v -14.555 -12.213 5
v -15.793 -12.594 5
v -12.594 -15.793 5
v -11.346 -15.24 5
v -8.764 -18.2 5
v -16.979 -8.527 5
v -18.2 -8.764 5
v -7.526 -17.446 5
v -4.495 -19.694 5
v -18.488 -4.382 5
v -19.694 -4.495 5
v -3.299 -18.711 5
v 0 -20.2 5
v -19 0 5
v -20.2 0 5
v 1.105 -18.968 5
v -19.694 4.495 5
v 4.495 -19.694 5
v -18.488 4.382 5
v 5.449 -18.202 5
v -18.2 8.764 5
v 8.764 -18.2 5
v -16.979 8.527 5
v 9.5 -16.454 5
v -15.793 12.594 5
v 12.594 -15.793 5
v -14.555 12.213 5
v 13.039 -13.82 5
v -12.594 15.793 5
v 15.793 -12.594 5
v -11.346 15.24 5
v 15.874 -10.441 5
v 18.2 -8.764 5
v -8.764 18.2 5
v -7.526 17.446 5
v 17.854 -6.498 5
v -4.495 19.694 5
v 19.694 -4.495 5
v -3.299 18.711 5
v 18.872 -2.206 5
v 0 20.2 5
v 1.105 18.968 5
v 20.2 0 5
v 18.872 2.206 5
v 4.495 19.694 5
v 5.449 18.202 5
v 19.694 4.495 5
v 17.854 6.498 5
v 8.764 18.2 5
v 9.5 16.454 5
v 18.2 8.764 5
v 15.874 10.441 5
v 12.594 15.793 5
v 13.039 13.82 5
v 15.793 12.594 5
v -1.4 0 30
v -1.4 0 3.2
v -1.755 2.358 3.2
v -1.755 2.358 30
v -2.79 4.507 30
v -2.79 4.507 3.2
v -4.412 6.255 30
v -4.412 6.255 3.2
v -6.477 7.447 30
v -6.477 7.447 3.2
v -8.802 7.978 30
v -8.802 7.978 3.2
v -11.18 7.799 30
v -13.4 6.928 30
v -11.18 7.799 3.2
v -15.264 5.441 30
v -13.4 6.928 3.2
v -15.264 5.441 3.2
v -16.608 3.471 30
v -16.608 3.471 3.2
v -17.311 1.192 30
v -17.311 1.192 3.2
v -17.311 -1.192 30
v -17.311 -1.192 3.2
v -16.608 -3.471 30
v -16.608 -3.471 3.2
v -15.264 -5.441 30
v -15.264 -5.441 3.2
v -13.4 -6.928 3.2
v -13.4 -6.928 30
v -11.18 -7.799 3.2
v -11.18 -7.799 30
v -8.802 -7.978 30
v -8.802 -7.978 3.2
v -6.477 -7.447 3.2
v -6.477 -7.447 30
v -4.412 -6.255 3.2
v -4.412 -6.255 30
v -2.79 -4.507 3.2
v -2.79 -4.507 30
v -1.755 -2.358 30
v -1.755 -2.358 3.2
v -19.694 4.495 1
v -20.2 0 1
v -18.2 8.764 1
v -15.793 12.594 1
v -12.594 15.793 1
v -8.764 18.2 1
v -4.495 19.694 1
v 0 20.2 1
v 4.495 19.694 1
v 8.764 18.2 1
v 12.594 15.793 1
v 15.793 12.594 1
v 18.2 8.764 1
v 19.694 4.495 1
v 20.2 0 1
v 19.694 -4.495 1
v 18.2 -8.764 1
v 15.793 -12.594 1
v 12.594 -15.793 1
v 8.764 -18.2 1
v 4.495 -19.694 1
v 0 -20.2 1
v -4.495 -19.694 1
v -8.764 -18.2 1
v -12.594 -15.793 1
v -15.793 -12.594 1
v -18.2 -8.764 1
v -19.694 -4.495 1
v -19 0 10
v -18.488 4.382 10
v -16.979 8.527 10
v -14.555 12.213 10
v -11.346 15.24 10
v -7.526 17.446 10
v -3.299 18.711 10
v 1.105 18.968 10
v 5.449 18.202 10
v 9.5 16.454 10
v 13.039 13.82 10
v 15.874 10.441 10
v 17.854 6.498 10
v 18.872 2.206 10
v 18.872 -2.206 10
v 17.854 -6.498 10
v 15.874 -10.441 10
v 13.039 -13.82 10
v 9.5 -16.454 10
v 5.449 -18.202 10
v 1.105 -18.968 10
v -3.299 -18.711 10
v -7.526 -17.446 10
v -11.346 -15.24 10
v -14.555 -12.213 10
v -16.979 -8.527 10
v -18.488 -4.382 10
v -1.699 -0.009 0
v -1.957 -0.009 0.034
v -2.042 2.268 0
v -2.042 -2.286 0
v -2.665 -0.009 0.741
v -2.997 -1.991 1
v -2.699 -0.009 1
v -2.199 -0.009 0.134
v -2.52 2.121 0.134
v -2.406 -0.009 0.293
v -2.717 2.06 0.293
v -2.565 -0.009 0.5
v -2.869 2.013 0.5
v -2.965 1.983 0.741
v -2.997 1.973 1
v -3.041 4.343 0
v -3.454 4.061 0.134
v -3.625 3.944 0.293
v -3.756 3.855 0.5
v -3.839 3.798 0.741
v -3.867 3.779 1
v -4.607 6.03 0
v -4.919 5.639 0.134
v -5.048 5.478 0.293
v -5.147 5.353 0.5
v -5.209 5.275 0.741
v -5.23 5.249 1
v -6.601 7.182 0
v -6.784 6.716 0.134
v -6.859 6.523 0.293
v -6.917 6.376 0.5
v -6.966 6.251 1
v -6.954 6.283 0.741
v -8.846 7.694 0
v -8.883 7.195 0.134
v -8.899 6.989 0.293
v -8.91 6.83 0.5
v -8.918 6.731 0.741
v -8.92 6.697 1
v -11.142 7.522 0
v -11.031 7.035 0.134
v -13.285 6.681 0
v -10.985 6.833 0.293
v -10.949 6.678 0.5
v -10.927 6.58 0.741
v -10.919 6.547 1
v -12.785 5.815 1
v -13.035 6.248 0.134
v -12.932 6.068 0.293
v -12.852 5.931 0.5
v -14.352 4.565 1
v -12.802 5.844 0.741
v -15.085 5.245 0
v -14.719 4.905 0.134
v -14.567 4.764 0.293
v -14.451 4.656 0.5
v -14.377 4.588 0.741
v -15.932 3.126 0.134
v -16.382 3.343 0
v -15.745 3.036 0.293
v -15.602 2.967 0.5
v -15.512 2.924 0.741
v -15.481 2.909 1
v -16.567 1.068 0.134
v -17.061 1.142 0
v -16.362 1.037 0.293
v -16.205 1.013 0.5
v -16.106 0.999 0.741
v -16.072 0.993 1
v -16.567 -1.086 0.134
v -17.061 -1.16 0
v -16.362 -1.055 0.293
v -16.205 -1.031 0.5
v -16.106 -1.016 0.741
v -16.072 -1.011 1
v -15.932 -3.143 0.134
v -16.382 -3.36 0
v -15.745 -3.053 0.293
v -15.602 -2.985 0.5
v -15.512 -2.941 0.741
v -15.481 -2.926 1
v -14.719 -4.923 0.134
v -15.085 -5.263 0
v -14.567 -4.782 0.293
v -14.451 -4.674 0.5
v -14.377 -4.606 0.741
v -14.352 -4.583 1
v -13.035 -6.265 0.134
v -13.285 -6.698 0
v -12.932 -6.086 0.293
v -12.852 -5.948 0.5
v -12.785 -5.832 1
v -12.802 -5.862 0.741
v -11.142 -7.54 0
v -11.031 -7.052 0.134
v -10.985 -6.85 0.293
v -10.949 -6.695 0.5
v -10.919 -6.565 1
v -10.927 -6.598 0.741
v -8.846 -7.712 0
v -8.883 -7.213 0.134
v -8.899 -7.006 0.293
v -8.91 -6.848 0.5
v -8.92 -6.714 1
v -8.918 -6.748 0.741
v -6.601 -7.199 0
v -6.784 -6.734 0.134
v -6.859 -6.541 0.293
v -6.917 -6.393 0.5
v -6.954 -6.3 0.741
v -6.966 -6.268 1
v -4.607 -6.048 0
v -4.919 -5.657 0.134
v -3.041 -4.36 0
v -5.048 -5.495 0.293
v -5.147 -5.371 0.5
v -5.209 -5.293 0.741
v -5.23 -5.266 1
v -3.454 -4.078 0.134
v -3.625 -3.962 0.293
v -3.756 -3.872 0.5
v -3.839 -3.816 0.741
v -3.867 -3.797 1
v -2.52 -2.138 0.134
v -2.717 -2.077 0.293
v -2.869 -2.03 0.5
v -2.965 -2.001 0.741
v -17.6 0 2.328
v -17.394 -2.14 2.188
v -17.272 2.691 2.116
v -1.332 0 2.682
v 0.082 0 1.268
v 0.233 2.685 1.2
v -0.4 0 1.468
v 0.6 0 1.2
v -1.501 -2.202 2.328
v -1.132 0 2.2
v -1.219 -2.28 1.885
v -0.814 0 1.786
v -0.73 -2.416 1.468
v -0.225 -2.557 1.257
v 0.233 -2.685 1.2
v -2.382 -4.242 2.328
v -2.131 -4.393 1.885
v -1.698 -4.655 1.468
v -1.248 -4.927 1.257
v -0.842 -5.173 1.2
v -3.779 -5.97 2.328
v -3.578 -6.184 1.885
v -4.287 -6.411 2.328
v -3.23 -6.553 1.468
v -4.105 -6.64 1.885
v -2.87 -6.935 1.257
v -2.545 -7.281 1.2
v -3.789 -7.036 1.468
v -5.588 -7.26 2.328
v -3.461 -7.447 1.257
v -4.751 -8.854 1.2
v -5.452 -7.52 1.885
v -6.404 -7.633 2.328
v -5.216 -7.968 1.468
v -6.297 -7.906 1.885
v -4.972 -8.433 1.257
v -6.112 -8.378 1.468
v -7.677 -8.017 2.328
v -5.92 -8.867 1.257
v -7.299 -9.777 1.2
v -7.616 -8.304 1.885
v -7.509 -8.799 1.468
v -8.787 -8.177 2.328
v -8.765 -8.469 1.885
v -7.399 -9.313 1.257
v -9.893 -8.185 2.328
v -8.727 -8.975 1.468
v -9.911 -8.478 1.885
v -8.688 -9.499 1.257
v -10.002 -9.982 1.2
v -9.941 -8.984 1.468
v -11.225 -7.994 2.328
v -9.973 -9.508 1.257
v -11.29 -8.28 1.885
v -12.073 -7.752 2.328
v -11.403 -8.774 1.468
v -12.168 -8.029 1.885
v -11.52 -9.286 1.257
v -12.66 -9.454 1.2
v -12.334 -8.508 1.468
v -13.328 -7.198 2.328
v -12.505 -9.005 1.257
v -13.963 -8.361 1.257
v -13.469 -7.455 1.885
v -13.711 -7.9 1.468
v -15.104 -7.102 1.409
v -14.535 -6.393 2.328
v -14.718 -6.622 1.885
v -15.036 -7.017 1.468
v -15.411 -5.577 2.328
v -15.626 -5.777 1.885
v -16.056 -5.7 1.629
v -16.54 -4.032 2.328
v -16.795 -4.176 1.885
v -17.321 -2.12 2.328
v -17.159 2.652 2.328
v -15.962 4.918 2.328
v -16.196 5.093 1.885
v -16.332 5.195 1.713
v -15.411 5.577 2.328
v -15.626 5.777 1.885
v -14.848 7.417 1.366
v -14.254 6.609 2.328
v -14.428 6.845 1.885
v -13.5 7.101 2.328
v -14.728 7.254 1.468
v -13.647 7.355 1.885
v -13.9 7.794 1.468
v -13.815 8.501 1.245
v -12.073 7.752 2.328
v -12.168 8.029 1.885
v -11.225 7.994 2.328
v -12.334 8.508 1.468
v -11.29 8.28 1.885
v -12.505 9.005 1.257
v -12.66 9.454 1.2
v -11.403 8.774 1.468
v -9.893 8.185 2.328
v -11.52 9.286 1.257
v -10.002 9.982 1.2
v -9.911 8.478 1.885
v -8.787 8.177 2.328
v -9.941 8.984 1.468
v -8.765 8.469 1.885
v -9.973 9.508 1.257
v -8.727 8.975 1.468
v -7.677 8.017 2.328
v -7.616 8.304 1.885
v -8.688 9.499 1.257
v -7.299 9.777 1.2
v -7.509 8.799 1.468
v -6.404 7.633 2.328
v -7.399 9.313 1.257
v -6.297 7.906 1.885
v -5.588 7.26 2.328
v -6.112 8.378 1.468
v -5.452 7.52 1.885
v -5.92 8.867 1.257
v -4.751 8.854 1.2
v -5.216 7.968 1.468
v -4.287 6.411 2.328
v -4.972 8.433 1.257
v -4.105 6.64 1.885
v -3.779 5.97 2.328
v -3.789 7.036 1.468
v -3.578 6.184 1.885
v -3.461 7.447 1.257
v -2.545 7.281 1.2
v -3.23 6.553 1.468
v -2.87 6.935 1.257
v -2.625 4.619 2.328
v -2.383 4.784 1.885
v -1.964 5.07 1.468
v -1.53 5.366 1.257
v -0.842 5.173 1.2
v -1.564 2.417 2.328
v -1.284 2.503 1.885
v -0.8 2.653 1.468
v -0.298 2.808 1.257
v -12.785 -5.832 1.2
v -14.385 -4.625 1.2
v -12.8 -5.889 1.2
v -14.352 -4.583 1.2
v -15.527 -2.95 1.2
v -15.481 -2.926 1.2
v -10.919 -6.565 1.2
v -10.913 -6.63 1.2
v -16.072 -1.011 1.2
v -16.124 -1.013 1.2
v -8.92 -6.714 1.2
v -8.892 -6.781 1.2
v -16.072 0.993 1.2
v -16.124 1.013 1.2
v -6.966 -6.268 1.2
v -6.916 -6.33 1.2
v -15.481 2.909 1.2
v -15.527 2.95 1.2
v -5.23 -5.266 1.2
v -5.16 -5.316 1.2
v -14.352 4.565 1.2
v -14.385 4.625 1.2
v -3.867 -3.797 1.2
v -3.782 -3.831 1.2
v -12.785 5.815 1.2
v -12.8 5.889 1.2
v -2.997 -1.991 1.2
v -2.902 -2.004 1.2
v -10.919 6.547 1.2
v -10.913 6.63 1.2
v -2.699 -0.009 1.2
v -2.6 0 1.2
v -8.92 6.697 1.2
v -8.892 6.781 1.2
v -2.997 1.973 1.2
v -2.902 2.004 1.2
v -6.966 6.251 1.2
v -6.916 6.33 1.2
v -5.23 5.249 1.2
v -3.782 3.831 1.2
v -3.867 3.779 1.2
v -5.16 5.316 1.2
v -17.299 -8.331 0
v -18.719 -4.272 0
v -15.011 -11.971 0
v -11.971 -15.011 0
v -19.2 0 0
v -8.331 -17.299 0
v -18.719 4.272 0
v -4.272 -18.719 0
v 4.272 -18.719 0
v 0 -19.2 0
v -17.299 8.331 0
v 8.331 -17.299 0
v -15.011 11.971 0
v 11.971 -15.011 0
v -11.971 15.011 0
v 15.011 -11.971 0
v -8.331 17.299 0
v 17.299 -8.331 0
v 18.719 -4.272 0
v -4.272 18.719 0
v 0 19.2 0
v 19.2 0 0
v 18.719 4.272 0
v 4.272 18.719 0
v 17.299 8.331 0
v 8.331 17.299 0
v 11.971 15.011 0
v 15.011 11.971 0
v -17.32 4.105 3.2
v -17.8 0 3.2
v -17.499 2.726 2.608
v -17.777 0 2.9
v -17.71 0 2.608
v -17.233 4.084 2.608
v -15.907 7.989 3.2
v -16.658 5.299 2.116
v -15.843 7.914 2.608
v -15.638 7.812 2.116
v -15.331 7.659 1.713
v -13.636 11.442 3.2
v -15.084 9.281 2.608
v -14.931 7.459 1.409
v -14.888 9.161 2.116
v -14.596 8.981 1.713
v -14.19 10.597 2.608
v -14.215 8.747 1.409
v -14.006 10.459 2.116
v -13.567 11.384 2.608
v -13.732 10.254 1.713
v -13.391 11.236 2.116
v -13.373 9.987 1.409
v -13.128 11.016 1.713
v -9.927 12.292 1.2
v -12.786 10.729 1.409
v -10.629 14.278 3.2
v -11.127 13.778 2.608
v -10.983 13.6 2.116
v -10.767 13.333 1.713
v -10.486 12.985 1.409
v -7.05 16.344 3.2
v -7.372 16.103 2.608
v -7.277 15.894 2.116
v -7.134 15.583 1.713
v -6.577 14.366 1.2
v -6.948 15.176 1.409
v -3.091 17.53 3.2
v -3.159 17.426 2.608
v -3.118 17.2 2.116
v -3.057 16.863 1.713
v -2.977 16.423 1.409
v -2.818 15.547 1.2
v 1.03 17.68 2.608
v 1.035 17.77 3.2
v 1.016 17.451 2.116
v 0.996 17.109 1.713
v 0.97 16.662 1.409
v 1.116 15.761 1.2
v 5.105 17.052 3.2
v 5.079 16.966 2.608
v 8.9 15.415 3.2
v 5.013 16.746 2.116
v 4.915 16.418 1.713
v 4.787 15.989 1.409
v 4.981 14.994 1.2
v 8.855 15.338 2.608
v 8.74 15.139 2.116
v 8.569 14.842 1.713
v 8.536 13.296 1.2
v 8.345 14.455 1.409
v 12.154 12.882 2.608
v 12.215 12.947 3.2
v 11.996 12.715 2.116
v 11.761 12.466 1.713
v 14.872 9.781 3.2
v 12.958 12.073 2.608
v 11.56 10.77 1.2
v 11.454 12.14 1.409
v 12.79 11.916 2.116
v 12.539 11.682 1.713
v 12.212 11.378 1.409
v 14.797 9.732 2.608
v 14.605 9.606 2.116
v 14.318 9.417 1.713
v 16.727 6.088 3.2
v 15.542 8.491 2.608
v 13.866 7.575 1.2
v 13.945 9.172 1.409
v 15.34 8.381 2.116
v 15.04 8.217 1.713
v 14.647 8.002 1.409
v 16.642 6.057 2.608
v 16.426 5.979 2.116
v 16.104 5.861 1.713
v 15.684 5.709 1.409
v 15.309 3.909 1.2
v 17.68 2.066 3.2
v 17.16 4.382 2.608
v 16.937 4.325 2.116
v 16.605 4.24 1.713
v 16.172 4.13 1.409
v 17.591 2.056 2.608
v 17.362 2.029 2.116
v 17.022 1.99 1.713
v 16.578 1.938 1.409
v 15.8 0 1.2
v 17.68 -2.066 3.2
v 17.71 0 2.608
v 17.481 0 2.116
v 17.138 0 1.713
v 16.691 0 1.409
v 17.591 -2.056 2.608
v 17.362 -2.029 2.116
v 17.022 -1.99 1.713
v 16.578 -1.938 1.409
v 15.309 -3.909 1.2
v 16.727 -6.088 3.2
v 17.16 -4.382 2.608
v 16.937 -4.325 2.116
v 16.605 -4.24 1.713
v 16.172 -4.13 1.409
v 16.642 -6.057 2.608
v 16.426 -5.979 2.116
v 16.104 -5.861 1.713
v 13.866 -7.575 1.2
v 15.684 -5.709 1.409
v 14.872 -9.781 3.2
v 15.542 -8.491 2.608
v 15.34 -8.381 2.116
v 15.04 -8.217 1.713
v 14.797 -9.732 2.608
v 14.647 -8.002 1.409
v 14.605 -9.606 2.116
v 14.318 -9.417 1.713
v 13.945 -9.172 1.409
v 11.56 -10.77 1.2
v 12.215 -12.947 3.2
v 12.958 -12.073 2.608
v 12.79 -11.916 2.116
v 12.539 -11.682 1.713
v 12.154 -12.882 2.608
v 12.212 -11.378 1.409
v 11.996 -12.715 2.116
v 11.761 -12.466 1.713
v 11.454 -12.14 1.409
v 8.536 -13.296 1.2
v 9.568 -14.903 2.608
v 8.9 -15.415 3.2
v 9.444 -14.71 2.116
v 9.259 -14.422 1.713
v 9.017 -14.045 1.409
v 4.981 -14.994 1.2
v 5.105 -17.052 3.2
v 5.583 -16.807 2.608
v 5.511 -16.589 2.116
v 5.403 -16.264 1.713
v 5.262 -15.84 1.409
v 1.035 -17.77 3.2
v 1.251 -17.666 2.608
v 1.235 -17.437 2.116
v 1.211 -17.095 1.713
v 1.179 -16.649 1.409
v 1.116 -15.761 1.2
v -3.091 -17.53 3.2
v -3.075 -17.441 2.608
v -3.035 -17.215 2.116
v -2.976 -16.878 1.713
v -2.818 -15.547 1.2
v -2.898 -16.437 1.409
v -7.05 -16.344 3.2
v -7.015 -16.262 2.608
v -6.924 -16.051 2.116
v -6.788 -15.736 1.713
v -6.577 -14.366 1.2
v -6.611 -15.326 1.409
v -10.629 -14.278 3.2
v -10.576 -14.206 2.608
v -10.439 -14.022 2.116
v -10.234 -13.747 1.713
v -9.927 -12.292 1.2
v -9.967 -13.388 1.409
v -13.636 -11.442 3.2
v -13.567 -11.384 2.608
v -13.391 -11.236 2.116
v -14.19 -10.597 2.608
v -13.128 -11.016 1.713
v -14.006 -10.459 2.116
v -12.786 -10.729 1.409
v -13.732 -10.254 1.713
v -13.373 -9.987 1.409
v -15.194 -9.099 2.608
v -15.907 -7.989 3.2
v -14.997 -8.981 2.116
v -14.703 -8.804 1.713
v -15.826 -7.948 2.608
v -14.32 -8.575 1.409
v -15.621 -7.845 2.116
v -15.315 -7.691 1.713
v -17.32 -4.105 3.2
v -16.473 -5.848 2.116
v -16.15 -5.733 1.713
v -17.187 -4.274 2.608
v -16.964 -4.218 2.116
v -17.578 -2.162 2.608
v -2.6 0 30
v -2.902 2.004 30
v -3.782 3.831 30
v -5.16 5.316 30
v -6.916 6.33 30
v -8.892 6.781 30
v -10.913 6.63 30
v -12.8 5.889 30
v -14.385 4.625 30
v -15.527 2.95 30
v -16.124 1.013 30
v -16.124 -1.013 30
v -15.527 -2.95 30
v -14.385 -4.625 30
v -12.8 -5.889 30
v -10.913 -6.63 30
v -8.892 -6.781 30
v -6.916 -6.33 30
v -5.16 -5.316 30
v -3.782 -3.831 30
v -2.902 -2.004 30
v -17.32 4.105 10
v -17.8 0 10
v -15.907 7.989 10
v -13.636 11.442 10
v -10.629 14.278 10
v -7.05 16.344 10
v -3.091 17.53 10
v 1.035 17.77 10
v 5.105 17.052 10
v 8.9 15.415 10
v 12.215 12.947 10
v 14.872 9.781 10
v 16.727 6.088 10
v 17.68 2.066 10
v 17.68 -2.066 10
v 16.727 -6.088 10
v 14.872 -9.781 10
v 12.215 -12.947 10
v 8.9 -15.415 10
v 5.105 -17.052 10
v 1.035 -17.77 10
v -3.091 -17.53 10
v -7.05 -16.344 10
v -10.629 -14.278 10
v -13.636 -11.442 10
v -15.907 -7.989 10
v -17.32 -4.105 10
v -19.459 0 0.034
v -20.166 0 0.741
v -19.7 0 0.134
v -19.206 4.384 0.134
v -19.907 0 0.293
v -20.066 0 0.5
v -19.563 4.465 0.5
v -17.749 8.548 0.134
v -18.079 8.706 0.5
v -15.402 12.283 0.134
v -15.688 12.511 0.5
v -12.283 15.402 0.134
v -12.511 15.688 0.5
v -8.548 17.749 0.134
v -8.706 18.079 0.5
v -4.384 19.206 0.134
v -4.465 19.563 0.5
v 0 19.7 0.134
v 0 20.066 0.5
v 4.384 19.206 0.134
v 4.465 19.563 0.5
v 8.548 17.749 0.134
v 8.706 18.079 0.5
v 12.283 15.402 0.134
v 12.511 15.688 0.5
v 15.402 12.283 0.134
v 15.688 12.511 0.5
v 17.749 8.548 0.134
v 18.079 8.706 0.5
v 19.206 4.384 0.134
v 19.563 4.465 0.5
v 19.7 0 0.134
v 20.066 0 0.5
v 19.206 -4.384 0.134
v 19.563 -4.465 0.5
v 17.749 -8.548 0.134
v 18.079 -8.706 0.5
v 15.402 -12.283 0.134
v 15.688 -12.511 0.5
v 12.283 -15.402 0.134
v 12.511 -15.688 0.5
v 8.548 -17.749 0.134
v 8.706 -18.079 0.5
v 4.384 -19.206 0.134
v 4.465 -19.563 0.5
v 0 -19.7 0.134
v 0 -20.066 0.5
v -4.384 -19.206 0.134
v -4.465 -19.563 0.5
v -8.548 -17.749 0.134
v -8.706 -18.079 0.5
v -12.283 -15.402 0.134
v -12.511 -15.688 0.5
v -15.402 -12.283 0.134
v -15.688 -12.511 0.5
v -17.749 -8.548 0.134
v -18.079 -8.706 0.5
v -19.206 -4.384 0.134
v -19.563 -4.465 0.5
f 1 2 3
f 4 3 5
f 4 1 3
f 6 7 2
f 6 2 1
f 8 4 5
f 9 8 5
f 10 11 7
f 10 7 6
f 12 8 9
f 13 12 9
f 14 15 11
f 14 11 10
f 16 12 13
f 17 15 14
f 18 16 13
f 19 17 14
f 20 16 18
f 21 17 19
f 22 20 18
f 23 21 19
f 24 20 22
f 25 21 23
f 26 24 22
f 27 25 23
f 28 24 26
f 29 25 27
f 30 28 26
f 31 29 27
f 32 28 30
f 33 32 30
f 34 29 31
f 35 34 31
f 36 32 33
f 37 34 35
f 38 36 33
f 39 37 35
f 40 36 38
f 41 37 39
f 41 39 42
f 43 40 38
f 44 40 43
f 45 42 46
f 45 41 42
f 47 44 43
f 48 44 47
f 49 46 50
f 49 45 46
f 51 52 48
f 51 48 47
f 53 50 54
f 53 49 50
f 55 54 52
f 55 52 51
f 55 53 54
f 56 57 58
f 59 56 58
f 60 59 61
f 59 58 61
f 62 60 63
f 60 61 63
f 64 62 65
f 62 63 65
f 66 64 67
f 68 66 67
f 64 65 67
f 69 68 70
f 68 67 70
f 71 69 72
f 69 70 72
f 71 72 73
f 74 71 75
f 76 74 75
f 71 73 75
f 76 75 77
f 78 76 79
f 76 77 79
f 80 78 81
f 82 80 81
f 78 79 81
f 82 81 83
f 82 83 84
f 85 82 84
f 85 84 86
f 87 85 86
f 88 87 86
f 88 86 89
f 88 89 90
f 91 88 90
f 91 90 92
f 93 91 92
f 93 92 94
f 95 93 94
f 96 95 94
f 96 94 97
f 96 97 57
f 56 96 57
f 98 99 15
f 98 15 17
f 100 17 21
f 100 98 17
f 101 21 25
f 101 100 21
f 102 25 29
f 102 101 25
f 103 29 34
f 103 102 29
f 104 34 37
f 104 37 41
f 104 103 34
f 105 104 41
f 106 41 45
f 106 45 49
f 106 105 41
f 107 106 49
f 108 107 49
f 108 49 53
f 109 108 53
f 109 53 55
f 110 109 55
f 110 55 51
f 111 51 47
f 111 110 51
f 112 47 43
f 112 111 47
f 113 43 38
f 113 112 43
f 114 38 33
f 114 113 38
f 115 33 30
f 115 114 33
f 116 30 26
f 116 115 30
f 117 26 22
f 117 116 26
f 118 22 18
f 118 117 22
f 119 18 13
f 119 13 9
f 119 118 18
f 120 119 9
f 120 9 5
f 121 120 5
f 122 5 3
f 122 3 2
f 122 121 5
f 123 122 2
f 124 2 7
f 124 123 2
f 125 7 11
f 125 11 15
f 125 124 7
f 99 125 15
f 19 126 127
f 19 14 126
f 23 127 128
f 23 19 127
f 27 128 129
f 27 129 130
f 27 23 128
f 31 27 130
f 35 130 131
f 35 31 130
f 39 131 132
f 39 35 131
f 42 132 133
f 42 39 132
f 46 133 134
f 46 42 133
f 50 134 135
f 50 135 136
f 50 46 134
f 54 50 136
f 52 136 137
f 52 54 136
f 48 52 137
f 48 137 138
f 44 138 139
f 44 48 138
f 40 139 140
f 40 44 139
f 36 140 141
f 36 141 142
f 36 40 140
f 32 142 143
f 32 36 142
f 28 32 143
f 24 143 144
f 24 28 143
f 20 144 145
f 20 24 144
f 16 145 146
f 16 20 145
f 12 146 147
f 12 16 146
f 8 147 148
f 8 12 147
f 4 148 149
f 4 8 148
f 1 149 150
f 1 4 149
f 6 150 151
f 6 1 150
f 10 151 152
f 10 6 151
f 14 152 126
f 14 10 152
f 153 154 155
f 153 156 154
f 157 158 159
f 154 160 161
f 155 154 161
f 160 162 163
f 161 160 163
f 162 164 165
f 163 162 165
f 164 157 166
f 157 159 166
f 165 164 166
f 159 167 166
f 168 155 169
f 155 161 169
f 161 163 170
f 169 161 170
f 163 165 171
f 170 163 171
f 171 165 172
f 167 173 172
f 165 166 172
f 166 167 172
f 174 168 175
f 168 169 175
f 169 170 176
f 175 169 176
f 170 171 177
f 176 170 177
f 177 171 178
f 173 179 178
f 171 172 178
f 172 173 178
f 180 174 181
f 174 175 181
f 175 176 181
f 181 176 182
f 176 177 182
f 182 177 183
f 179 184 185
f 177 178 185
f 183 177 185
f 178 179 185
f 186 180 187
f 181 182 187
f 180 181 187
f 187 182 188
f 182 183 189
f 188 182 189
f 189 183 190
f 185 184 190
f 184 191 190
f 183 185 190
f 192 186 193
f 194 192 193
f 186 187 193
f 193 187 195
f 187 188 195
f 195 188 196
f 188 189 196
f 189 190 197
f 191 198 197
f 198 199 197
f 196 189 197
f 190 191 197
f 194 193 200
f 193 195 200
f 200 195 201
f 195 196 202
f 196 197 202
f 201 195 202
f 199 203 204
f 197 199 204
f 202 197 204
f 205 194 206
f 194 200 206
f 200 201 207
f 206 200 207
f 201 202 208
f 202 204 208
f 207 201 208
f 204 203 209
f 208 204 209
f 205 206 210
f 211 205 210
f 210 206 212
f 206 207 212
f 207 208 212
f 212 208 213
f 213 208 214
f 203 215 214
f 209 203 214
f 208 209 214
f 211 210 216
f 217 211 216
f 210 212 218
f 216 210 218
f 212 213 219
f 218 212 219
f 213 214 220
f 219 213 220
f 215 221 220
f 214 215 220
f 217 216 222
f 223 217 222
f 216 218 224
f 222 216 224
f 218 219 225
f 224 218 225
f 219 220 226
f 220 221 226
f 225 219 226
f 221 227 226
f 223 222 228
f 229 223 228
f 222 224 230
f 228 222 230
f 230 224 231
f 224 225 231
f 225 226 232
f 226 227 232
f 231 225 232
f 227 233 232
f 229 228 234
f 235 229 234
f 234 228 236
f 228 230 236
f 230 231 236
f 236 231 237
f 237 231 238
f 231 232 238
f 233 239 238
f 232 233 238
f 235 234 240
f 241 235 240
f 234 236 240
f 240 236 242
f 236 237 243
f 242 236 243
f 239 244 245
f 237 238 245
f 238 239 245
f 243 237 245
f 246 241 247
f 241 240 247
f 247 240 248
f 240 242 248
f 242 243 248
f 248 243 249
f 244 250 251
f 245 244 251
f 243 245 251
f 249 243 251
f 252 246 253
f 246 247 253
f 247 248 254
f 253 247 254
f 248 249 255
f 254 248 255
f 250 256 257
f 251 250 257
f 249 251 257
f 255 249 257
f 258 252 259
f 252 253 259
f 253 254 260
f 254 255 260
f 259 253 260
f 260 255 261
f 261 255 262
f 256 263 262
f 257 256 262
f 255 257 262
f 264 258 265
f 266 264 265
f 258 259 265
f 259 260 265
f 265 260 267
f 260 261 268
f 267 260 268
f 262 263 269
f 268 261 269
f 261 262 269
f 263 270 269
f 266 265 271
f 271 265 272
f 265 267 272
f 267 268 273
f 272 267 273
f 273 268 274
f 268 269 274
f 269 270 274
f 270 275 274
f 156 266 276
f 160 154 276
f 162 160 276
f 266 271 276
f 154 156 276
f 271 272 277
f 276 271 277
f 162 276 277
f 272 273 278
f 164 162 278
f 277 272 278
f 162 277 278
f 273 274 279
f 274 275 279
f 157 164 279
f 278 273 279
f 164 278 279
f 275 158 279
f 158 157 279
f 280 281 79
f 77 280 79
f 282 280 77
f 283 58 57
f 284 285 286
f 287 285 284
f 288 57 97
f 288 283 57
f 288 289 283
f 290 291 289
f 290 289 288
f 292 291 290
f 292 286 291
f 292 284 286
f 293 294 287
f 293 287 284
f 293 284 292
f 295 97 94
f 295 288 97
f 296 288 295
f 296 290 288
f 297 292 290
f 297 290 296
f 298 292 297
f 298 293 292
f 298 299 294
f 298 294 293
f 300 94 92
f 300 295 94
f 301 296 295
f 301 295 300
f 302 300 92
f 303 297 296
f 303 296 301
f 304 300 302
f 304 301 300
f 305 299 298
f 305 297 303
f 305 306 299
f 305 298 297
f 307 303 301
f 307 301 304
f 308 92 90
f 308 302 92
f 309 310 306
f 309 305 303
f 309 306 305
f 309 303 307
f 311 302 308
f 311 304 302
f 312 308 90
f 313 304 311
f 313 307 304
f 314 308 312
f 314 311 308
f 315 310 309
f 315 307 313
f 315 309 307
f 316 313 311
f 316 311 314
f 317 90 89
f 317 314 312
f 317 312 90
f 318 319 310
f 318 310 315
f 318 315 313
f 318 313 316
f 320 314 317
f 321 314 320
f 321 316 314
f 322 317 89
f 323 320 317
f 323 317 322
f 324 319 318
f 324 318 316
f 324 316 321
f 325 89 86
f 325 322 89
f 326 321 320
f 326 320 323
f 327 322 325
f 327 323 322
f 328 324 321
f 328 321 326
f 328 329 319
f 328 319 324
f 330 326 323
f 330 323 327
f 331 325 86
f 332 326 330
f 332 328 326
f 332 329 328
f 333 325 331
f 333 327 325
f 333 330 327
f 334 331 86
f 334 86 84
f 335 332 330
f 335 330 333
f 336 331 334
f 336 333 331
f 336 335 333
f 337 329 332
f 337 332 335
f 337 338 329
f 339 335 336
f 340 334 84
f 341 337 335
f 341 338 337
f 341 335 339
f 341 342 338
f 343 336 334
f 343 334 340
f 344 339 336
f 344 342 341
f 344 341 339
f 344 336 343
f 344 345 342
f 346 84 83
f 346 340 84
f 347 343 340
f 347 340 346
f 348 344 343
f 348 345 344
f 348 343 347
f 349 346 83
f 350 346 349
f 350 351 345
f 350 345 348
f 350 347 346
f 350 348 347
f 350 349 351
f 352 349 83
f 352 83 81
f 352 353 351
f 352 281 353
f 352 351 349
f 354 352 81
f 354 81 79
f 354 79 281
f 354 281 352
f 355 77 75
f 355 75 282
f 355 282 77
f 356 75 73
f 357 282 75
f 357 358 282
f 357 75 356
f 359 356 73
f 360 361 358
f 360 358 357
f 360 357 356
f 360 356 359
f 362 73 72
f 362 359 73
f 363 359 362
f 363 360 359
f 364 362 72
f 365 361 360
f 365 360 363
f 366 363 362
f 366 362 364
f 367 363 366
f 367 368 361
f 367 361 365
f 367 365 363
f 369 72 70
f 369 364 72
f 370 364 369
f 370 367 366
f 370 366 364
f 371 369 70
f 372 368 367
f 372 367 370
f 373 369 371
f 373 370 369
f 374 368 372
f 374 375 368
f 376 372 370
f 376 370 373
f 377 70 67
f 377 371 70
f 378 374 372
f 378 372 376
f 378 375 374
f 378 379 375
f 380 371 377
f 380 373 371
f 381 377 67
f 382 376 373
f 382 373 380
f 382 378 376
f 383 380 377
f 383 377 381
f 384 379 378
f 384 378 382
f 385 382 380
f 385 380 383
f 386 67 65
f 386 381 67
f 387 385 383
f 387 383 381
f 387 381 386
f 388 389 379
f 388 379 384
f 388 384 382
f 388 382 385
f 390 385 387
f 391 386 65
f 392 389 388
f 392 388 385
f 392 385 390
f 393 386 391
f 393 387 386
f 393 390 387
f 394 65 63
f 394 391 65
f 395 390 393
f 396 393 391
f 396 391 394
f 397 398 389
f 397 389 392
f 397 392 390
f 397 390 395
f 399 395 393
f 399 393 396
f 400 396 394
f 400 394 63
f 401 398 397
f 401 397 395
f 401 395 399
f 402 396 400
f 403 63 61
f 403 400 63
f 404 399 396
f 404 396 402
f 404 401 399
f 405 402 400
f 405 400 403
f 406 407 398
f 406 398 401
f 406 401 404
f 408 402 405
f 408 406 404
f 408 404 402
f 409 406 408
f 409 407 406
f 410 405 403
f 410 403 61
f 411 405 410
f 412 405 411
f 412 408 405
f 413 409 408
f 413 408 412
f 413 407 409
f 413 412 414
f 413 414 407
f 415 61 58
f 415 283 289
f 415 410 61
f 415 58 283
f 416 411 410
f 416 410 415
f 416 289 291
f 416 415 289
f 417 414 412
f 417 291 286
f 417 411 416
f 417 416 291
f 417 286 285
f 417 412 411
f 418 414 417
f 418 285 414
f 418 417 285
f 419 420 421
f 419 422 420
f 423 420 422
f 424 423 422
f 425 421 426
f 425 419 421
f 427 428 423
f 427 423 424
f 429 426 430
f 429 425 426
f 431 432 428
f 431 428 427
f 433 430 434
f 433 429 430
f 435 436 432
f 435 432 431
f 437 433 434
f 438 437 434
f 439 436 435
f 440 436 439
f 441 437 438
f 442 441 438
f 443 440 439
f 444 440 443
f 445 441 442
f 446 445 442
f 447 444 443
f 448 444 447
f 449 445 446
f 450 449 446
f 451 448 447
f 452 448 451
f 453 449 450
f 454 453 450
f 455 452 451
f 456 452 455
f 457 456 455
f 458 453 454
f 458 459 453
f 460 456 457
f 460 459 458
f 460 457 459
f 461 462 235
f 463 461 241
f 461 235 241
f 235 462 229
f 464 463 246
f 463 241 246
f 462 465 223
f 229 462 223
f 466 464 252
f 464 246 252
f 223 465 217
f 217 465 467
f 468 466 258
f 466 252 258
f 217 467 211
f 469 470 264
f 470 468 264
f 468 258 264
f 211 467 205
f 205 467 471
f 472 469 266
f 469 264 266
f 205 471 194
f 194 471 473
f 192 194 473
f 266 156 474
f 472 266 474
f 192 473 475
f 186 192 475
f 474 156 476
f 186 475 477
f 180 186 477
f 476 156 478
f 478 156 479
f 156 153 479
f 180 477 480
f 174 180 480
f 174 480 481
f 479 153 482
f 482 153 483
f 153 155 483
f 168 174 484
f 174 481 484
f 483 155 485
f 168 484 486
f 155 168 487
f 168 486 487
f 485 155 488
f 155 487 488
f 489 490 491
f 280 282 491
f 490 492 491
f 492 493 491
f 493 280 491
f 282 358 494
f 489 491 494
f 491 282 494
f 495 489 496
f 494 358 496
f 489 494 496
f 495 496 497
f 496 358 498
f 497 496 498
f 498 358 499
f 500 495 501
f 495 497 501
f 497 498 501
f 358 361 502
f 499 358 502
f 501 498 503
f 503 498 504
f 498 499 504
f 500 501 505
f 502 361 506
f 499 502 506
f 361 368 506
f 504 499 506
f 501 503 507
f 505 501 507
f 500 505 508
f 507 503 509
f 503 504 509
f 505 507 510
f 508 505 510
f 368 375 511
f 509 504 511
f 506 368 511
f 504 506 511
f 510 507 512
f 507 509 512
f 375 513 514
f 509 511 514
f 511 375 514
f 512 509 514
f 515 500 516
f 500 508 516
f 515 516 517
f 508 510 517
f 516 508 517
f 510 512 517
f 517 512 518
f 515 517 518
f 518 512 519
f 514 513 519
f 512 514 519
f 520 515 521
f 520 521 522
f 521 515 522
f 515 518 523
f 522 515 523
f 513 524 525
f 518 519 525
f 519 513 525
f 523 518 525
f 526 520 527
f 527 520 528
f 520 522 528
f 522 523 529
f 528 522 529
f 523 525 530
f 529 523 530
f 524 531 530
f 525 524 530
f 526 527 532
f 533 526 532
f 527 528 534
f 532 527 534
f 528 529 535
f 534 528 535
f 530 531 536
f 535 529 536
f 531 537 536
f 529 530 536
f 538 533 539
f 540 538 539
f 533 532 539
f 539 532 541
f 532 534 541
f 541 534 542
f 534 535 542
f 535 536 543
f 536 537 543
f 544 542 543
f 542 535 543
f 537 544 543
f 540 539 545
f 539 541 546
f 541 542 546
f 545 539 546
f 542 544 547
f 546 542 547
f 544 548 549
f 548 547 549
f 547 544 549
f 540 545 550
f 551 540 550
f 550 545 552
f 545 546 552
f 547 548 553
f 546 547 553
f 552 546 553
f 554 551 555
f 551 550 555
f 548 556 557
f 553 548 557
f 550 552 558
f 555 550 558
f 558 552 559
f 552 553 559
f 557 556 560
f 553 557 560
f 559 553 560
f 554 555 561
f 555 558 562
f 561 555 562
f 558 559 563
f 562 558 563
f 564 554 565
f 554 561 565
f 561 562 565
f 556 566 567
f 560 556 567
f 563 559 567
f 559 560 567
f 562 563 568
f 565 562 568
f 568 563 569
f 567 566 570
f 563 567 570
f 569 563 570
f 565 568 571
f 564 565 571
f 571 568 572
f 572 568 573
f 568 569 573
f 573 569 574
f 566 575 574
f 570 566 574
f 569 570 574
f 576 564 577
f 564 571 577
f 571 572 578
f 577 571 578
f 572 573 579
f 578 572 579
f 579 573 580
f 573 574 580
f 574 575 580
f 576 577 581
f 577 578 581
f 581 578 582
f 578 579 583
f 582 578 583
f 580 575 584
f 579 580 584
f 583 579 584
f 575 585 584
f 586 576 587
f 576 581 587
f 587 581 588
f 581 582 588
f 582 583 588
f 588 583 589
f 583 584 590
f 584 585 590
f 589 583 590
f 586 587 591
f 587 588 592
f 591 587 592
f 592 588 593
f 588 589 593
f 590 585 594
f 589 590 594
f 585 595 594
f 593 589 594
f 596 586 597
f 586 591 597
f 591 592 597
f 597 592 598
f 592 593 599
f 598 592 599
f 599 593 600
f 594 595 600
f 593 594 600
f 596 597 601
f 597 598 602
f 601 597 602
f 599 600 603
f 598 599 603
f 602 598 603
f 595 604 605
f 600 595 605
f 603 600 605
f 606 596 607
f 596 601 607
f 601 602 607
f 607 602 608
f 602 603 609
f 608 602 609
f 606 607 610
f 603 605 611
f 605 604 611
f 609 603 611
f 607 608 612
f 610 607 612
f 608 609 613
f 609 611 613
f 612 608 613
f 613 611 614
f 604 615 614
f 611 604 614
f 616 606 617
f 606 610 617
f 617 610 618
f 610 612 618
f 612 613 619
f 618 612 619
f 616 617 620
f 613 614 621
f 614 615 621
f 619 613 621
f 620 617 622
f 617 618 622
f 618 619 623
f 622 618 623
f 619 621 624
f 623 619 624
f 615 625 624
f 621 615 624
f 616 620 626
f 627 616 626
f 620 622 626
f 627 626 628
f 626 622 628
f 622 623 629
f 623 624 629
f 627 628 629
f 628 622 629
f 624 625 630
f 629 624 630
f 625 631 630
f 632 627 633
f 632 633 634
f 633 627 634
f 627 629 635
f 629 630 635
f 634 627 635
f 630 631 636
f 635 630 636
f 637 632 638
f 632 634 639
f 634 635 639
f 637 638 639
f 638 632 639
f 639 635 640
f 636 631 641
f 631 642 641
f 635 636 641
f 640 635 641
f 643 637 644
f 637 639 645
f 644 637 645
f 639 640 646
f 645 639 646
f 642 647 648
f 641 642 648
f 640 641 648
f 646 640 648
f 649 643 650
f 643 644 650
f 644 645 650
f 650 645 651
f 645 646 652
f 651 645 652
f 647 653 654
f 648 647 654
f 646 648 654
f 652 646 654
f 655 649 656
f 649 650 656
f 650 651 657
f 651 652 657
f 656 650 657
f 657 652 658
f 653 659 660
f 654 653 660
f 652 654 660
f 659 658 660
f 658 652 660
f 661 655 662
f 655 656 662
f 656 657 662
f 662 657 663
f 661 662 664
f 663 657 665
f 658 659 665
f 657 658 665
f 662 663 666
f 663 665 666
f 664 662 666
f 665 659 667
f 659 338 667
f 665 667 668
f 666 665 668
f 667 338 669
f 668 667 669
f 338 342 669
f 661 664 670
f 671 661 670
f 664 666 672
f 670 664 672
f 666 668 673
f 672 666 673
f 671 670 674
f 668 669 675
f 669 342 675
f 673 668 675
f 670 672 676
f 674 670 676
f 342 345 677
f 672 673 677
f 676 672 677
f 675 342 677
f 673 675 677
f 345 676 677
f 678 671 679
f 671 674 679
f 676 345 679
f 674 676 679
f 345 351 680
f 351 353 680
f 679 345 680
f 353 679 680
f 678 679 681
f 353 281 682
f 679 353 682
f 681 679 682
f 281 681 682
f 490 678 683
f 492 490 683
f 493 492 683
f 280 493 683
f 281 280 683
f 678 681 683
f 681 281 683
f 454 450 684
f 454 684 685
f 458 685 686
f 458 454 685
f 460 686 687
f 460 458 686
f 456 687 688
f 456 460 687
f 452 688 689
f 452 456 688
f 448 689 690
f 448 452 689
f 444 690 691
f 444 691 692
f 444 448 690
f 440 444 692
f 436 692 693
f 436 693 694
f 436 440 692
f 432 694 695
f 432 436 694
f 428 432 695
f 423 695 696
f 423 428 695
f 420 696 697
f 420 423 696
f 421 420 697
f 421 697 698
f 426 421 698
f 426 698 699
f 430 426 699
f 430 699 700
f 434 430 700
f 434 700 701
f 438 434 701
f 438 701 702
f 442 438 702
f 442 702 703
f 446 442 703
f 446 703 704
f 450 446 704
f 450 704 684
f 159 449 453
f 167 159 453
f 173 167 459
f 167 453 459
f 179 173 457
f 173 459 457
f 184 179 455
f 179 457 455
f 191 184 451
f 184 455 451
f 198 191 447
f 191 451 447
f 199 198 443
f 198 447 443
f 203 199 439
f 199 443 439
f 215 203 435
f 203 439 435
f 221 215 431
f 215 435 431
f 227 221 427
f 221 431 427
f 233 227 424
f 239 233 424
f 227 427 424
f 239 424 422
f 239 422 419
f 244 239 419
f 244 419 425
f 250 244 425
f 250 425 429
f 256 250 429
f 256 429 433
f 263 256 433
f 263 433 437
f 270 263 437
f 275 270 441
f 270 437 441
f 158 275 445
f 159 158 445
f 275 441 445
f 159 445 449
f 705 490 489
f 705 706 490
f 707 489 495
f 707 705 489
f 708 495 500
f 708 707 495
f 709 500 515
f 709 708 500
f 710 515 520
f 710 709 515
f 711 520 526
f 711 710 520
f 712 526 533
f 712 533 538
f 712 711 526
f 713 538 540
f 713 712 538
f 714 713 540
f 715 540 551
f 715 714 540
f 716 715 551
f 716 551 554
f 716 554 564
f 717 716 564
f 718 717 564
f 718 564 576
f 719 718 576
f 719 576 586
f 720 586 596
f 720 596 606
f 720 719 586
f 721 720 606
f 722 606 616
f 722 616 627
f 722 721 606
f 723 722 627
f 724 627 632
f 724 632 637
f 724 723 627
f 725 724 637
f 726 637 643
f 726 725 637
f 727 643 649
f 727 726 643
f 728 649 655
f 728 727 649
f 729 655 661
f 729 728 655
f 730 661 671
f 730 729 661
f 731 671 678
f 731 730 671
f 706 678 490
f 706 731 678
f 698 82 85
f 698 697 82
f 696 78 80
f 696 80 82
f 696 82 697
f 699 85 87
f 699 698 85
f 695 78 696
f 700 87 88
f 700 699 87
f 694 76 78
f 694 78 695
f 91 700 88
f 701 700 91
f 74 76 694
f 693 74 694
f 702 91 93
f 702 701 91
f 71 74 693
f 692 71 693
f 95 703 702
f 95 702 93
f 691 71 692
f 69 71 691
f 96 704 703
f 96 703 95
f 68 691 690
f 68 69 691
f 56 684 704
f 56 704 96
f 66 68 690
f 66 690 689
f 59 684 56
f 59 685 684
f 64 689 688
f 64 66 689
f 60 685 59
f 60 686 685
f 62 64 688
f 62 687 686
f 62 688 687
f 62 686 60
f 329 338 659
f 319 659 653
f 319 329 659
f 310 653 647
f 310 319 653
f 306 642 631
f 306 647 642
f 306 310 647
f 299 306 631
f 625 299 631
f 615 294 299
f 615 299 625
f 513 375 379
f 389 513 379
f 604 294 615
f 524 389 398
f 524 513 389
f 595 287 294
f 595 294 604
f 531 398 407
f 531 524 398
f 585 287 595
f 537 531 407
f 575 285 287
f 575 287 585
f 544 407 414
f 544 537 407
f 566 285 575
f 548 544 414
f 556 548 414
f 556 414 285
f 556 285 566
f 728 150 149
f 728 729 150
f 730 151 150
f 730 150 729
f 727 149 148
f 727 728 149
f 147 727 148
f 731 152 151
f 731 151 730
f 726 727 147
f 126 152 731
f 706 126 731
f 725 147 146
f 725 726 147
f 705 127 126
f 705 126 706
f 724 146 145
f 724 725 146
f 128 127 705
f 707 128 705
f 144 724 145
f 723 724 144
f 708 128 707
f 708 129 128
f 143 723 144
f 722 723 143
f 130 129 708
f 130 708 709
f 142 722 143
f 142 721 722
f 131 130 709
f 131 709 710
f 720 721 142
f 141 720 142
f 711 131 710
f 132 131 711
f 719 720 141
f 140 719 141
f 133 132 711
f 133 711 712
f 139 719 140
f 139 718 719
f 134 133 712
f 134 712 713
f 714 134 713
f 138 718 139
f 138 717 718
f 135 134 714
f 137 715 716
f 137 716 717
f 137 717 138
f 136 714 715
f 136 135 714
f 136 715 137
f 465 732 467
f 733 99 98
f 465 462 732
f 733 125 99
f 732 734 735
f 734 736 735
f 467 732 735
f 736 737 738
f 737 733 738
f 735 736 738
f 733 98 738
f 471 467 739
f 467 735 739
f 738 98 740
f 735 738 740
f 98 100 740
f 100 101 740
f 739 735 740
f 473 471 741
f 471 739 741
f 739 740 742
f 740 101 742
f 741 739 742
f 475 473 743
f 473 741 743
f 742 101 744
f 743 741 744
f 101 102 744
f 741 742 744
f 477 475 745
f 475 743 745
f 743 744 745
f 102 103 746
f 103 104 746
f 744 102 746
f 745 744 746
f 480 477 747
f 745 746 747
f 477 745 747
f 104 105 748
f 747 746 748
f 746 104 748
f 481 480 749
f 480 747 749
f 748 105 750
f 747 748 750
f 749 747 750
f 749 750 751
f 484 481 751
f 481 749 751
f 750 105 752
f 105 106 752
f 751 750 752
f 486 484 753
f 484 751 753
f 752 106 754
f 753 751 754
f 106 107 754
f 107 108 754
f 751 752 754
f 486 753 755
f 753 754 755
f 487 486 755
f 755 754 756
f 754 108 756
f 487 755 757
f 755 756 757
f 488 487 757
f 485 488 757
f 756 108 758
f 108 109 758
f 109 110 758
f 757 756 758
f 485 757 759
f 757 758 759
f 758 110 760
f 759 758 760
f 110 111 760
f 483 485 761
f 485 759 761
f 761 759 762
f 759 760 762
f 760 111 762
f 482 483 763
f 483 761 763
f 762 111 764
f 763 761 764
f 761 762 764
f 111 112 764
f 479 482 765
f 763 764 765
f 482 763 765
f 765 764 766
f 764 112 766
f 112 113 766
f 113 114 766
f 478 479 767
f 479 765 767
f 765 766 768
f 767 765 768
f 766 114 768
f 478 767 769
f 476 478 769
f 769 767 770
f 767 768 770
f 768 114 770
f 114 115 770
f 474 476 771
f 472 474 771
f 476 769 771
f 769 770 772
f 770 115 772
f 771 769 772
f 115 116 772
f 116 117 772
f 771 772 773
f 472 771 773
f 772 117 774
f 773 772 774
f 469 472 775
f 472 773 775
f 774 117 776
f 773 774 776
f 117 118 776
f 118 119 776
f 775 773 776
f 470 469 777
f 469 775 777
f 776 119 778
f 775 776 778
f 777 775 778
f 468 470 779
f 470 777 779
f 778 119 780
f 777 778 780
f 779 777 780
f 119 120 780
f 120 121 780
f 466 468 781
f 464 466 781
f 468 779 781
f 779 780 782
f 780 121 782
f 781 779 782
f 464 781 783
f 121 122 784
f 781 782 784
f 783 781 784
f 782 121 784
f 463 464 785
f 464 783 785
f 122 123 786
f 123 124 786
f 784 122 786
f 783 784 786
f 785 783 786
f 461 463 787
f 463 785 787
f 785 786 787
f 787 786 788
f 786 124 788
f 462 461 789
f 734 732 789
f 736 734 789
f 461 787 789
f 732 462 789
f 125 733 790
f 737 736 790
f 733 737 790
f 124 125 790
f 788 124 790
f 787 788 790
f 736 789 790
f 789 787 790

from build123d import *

# Parameters (mm, degrees)
F2_R        = 8
F2_R_2      = 6.8
F3_DEPTH    = 30
F4_R        = 6.7244244579
F5_DEPTH    = 2.5
F6_R        = 1
F7_S7_R     = 8
F7_T8_DEPTH = 29


# Not quite as in the source:
# - a fillet or chamfer that OpenCascade refuses, or shapes differently, is made with other operations: its cross-section is extruded or revolved along the edge and cut away or added


with BuildPart() as f1:
    # F0 (on Front) → F1 (revolve)
    with BuildSketch(Plane.XZ):
        Polygon((-20.2, 0), (0, 0), (0, 1.2), (-17.8, 1.2), (-17.8, 10), (-19, 10), (-19, 5), (-20.2, 5), align=None)
    revolve(axis=Axis((0, 0, 6.5113101155), (0, 0, -1)))

    # F2 (on Top) → F3 (join)
    with BuildSketch(Plane.XY):
        with Locations((-9.4, 0)):
            Circle(F2_R)
        with Locations((-9.4, 0)):
            Circle(F2_R_2, mode=Mode.SUBTRACT)
    extrude(amount=F3_DEPTH)

    # F4 (on Top) → F5 (cut, symmetric)
    with BuildSketch(Plane.XY):
        with Locations((-9.4230027523, -0.008787398)):
            Circle(F4_R)
    extrude(amount=F5_DEPTH, both=True, mode=Mode.SUBTRACT)

    # F6
    f6_edges = [f1.edges().sort_by_distance(p)[0] for p in [
        (20.2, 0, 0),
        (-16.147427, -0.008787, 0),
    ]]
    fillet(f6_edges, radius=F6_R)

    # F7: fillet of radius 2 on 2 edges, made by hand

    # F7_s1 → F7_t2 (revolve)
    with BuildSketch(Plane.XZ):
        with BuildLine():
            ThreePointArc((-1.4, 3.2), (-0.8142135624, 1.7857864376), (0.6, 1.2))
            Line((0.6, 1.2), (-1.4, 1.2))
            Line((-1.4, 1.2), (-1.4, 3.2))
        make_face()
    revolve(axis=Axis((-9.4, 0, 1.2), (0, 0, -1)))


with BuildPart() as f7_tool4:
    # F7_s5 → F7_t6 (revolve)
    with BuildSketch(Plane.XZ):
        with BuildLine():
            ThreePointArc((-17.8, 3.2), (-17.2142135624, 1.7857864376), (-15.8, 1.2))
            Line((-15.8, 1.2), (-17.8, 1.2))
            Line((-17.8, 1.2), (-17.8, 3.2))
        make_face()
    revolve(axis=Axis((0, 0, 1.2), (0, 0, -1)))

    # F7_s7 → F7_t8 (cut, symmetric)
    with BuildSketch(Plane.XY.offset(2.2)):
        with Locations((-9.4, 0)):
            Circle(F7_S7_R)
    extrude(amount=F7_T8_DEPTH, both=True, mode=Mode.SUBTRACT)


with BuildPart() as f1_1:
    add(f1.part)

    # F7_t3: union F7_tool4
    add(f7_tool4.part)


solid = f1_1.part
